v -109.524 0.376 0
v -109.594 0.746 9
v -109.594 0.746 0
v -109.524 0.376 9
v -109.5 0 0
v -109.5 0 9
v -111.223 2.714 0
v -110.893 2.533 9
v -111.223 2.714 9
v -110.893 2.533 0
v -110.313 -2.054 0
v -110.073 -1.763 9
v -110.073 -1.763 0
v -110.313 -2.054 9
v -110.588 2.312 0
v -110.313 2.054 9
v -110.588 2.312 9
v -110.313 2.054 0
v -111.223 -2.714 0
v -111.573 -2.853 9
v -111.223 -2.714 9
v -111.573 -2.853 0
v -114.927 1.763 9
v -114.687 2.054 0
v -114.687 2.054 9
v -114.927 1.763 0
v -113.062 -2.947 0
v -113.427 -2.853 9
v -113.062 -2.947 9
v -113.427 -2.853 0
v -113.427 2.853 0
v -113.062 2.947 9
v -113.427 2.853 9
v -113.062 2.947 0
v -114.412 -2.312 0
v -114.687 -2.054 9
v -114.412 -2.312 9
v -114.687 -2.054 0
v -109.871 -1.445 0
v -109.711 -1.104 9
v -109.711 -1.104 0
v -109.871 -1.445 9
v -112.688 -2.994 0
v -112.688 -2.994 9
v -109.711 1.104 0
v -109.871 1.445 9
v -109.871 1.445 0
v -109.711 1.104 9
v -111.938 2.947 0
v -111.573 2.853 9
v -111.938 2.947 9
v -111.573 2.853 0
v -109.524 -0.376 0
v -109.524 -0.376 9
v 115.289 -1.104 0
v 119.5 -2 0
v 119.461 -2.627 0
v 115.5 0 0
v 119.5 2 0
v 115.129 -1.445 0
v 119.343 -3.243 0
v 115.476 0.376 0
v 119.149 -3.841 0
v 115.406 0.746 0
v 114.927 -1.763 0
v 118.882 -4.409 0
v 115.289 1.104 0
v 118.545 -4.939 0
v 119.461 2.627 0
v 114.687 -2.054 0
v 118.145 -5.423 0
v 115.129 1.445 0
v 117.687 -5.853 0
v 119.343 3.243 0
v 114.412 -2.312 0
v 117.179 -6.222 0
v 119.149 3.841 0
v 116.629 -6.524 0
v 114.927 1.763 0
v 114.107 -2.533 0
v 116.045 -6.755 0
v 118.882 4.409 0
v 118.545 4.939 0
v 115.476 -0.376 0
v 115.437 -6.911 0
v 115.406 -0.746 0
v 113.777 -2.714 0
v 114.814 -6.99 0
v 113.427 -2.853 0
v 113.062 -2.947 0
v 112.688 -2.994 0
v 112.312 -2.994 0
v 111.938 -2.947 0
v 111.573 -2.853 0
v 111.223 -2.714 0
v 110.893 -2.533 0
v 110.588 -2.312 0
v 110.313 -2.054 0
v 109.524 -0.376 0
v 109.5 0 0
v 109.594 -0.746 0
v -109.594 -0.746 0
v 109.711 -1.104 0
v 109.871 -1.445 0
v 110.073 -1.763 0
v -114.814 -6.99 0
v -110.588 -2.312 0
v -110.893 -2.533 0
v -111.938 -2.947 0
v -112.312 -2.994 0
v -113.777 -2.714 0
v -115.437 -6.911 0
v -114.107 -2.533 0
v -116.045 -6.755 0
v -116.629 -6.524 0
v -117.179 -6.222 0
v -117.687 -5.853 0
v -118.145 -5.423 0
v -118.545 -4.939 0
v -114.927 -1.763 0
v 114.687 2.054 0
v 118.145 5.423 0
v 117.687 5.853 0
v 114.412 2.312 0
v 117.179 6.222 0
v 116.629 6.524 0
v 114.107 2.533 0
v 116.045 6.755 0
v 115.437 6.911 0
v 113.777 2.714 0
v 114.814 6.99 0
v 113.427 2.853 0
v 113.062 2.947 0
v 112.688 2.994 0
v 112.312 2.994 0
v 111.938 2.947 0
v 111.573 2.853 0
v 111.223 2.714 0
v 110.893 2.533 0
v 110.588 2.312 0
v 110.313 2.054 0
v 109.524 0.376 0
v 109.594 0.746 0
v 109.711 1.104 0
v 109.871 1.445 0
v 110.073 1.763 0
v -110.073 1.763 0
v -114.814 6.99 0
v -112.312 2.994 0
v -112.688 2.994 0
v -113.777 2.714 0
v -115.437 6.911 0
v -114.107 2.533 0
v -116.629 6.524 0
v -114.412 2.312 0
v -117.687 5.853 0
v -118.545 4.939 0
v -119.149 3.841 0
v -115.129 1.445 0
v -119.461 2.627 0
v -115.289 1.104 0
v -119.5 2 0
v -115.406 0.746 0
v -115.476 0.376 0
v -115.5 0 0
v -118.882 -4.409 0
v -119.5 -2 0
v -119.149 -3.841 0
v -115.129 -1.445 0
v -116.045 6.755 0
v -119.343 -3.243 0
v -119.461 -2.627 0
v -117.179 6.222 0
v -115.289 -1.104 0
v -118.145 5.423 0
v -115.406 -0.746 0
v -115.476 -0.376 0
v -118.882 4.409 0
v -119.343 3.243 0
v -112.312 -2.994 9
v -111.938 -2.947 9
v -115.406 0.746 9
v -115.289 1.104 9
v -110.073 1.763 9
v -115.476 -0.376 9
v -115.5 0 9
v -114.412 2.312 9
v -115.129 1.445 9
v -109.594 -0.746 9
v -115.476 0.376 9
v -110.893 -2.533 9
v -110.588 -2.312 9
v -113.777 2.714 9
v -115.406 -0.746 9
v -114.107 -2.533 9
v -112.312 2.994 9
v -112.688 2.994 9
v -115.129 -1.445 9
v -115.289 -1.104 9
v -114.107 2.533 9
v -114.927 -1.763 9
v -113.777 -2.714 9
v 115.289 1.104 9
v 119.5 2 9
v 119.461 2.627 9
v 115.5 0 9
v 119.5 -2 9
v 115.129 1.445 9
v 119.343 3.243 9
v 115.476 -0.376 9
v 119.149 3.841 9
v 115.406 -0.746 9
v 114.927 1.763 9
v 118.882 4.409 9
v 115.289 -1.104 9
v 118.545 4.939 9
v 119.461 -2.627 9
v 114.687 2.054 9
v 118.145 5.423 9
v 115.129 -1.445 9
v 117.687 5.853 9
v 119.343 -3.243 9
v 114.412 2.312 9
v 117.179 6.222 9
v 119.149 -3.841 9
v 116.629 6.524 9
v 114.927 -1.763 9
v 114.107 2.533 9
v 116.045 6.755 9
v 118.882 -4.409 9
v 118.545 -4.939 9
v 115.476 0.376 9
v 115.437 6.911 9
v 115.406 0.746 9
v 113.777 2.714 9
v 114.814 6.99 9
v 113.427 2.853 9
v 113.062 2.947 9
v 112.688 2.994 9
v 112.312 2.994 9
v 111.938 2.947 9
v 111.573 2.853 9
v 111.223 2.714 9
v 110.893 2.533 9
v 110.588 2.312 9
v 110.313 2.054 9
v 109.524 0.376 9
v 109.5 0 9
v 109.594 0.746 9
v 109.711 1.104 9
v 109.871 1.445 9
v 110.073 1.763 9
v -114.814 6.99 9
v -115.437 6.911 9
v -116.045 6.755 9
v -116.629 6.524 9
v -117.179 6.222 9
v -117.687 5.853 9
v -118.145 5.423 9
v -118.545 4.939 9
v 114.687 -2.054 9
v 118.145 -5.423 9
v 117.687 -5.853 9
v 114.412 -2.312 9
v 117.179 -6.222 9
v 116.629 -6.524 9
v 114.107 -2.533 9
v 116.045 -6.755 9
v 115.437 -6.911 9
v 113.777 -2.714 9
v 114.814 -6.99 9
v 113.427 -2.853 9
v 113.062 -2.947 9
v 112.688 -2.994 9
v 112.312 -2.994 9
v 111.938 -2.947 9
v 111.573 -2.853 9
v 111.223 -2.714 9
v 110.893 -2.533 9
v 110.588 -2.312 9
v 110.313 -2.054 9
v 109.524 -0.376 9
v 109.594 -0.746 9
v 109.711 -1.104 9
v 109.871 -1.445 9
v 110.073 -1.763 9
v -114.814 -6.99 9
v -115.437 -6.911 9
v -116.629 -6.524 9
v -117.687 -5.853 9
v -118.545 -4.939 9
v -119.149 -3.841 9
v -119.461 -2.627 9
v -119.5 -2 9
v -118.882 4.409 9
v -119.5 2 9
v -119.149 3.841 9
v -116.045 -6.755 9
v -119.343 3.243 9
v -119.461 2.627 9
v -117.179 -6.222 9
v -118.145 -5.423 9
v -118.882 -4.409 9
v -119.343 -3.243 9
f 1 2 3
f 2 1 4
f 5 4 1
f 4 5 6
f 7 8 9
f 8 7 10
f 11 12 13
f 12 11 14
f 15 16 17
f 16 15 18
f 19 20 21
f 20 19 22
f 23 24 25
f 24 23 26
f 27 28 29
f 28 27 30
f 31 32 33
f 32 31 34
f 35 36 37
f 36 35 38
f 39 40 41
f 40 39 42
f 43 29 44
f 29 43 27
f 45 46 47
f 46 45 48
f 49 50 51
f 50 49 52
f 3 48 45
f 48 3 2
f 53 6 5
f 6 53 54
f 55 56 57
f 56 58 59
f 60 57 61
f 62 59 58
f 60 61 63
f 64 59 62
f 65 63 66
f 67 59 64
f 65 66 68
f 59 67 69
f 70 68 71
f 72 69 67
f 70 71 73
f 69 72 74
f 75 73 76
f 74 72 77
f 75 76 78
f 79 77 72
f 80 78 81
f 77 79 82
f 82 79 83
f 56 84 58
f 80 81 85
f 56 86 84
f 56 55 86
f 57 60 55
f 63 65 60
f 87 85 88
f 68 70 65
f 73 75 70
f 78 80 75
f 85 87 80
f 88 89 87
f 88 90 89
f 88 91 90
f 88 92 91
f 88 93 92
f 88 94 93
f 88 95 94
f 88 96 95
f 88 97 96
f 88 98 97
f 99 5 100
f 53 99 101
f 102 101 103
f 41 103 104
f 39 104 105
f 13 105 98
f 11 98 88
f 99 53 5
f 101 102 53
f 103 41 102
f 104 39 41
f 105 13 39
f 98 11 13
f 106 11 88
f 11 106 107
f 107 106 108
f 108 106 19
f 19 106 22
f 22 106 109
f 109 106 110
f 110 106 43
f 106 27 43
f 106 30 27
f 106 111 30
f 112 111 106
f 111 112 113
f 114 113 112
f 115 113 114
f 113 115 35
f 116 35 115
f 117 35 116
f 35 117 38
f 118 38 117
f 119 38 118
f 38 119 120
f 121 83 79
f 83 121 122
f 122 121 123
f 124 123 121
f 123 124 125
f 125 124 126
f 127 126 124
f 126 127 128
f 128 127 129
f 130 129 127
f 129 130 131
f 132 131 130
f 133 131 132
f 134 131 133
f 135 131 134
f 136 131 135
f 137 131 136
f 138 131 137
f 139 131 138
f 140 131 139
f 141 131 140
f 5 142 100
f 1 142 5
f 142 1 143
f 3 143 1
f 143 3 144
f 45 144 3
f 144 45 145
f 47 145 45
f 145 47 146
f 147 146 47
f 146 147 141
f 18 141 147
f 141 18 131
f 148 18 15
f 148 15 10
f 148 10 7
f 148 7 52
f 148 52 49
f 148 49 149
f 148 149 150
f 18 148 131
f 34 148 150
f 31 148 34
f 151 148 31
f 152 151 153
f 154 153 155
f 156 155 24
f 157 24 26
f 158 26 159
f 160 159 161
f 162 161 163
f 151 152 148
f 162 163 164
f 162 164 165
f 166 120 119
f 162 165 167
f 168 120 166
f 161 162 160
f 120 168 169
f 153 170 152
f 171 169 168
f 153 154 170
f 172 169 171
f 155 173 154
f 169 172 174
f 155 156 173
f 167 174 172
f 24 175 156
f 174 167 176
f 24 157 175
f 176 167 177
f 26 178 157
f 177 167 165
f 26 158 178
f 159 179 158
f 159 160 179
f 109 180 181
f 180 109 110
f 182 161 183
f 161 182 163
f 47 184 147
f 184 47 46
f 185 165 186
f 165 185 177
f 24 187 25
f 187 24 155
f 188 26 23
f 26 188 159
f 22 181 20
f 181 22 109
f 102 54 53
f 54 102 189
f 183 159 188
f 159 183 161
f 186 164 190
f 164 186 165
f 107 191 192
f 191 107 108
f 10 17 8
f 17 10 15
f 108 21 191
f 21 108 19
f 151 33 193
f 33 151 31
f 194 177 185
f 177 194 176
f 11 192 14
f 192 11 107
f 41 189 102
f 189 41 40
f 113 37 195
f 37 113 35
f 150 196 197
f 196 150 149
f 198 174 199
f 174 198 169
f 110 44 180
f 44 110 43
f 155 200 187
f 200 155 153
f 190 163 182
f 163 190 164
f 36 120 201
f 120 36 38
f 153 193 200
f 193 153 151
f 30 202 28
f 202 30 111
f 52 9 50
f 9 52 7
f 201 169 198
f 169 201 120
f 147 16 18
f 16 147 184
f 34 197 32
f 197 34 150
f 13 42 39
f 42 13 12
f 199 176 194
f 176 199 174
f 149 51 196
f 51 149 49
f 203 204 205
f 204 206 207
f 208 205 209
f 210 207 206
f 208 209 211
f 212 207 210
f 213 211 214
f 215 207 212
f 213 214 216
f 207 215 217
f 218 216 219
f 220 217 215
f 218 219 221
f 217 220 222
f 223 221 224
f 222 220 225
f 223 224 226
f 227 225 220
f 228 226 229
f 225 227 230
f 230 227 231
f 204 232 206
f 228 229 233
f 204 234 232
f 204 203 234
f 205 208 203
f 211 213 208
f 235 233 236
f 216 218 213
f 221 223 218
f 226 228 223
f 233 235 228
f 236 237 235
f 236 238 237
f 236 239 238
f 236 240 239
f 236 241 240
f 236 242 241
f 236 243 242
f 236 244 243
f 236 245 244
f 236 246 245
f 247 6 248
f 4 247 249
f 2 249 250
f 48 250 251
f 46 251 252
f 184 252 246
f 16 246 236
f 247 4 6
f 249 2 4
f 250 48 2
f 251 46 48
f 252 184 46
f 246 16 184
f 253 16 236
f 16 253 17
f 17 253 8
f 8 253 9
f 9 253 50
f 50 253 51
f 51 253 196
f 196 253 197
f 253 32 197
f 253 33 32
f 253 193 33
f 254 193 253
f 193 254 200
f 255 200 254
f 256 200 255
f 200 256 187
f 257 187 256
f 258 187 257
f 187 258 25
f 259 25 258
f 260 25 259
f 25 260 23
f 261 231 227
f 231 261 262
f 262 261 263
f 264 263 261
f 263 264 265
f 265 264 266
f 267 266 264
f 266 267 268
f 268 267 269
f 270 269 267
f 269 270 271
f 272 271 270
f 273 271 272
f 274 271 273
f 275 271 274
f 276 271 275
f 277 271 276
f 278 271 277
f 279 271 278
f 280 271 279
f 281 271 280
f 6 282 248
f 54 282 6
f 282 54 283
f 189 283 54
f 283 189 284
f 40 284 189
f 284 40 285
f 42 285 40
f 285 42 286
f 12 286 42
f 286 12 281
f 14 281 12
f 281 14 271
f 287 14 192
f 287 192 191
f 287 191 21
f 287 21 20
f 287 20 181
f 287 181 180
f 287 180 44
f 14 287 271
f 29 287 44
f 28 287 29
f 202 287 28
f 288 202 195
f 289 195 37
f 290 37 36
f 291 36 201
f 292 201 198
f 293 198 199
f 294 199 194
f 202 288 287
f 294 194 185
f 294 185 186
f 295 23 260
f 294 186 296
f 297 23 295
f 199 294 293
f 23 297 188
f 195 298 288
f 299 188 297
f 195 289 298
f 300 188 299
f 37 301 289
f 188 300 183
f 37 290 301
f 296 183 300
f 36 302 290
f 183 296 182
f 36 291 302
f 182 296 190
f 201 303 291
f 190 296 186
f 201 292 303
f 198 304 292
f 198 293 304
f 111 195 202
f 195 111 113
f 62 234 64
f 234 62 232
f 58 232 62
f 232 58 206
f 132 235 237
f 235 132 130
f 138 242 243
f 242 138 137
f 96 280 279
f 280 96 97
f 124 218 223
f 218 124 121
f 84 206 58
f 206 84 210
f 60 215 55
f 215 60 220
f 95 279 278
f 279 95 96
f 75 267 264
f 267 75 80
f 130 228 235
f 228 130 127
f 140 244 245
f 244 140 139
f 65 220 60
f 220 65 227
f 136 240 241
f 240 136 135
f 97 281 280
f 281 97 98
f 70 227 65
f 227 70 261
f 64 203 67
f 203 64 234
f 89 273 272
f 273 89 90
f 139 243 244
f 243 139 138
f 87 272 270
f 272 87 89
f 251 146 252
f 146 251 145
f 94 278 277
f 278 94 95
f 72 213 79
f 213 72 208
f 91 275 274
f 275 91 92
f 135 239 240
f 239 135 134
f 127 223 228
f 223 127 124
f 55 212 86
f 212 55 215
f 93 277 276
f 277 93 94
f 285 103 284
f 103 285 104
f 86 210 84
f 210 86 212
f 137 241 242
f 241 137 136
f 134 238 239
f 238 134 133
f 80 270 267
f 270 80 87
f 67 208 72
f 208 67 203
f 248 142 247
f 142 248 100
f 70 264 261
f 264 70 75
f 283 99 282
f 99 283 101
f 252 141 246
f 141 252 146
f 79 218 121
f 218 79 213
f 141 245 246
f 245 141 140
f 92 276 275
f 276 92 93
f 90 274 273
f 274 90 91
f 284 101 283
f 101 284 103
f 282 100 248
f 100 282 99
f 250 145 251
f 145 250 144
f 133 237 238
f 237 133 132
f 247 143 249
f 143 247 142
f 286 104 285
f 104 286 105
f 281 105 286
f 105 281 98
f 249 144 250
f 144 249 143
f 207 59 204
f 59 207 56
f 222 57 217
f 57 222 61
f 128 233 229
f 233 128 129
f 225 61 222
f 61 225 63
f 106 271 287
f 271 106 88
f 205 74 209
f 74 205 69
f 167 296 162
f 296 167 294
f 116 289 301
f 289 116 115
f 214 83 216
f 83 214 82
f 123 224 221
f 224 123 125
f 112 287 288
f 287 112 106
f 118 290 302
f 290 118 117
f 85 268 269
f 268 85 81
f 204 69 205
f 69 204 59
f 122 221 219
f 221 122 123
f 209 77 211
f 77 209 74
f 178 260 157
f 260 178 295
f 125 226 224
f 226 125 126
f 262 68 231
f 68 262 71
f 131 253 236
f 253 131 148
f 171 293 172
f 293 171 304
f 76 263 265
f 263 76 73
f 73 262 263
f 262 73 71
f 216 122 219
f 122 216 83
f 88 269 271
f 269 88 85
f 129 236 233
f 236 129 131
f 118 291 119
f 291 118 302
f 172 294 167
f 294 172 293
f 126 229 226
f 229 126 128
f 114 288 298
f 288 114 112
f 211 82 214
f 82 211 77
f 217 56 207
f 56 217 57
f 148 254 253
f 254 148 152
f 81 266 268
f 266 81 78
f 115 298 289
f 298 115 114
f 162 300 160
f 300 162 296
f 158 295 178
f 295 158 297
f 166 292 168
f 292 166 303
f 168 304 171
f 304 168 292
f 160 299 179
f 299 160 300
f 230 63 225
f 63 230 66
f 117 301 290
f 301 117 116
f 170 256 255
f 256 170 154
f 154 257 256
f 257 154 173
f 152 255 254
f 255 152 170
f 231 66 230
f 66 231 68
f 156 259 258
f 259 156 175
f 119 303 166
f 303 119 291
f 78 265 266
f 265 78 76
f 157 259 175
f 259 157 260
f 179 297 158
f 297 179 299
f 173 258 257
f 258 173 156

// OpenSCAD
$fn = 50;


difference() {
	union() {
		hull() {
			translate(v = [-114.5000000000, 2.0000000000, 0]) {
				cylinder(h = 9, r = 5);
			}
			translate(v = [114.5000000000, 2.0000000000, 0]) {
				cylinder(h = 9, r = 5);
			}
			translate(v = [-114.5000000000, -2.0000000000, 0]) {
				cylinder(h = 9, r = 5);
			}
			translate(v = [114.5000000000, -2.0000000000, 0]) {
				cylinder(h = 9, r = 5);
			}
		}
	}
	union() {
		translate(v = [-112.5000000000, 0.0000000000, 0]) {
			cylinder(h = 9, r = 3.0000000000);
		}
		translate(v = [112.5000000000, 0.0000000000, 0]) {
			cylinder(h = 9, r = 3.0000000000);
		}
		translate(v = [-112.5000000000, 0.0000000000, 0]) {
			cylinder(h = 9, r = 1.5000000000);
		}
		translate(v = [112.5000000000, 0.0000000000, 0]) {
			cylinder(h = 9, r = 1.5000000000);
		}
		translate(v = [-112.5000000000, 0.0000000000, 0]) {
			cylinder(h = 9, r = 1.5000000000);
		}
		translate(v = [112.5000000000, 0.0000000000, 0]) {
			cylinder(h = 9, r = 1.5000000000);
		}
		translate(v = [-112.5000000000, 0.0000000000, 0]) {
			cylinder(h = 9, r = 1.5000000000);
		}
		translate(v = [112.5000000000, 0.0000000000, 0]) {
			cylinder(h = 9, r = 1.5000000000);
		}
	}
}
